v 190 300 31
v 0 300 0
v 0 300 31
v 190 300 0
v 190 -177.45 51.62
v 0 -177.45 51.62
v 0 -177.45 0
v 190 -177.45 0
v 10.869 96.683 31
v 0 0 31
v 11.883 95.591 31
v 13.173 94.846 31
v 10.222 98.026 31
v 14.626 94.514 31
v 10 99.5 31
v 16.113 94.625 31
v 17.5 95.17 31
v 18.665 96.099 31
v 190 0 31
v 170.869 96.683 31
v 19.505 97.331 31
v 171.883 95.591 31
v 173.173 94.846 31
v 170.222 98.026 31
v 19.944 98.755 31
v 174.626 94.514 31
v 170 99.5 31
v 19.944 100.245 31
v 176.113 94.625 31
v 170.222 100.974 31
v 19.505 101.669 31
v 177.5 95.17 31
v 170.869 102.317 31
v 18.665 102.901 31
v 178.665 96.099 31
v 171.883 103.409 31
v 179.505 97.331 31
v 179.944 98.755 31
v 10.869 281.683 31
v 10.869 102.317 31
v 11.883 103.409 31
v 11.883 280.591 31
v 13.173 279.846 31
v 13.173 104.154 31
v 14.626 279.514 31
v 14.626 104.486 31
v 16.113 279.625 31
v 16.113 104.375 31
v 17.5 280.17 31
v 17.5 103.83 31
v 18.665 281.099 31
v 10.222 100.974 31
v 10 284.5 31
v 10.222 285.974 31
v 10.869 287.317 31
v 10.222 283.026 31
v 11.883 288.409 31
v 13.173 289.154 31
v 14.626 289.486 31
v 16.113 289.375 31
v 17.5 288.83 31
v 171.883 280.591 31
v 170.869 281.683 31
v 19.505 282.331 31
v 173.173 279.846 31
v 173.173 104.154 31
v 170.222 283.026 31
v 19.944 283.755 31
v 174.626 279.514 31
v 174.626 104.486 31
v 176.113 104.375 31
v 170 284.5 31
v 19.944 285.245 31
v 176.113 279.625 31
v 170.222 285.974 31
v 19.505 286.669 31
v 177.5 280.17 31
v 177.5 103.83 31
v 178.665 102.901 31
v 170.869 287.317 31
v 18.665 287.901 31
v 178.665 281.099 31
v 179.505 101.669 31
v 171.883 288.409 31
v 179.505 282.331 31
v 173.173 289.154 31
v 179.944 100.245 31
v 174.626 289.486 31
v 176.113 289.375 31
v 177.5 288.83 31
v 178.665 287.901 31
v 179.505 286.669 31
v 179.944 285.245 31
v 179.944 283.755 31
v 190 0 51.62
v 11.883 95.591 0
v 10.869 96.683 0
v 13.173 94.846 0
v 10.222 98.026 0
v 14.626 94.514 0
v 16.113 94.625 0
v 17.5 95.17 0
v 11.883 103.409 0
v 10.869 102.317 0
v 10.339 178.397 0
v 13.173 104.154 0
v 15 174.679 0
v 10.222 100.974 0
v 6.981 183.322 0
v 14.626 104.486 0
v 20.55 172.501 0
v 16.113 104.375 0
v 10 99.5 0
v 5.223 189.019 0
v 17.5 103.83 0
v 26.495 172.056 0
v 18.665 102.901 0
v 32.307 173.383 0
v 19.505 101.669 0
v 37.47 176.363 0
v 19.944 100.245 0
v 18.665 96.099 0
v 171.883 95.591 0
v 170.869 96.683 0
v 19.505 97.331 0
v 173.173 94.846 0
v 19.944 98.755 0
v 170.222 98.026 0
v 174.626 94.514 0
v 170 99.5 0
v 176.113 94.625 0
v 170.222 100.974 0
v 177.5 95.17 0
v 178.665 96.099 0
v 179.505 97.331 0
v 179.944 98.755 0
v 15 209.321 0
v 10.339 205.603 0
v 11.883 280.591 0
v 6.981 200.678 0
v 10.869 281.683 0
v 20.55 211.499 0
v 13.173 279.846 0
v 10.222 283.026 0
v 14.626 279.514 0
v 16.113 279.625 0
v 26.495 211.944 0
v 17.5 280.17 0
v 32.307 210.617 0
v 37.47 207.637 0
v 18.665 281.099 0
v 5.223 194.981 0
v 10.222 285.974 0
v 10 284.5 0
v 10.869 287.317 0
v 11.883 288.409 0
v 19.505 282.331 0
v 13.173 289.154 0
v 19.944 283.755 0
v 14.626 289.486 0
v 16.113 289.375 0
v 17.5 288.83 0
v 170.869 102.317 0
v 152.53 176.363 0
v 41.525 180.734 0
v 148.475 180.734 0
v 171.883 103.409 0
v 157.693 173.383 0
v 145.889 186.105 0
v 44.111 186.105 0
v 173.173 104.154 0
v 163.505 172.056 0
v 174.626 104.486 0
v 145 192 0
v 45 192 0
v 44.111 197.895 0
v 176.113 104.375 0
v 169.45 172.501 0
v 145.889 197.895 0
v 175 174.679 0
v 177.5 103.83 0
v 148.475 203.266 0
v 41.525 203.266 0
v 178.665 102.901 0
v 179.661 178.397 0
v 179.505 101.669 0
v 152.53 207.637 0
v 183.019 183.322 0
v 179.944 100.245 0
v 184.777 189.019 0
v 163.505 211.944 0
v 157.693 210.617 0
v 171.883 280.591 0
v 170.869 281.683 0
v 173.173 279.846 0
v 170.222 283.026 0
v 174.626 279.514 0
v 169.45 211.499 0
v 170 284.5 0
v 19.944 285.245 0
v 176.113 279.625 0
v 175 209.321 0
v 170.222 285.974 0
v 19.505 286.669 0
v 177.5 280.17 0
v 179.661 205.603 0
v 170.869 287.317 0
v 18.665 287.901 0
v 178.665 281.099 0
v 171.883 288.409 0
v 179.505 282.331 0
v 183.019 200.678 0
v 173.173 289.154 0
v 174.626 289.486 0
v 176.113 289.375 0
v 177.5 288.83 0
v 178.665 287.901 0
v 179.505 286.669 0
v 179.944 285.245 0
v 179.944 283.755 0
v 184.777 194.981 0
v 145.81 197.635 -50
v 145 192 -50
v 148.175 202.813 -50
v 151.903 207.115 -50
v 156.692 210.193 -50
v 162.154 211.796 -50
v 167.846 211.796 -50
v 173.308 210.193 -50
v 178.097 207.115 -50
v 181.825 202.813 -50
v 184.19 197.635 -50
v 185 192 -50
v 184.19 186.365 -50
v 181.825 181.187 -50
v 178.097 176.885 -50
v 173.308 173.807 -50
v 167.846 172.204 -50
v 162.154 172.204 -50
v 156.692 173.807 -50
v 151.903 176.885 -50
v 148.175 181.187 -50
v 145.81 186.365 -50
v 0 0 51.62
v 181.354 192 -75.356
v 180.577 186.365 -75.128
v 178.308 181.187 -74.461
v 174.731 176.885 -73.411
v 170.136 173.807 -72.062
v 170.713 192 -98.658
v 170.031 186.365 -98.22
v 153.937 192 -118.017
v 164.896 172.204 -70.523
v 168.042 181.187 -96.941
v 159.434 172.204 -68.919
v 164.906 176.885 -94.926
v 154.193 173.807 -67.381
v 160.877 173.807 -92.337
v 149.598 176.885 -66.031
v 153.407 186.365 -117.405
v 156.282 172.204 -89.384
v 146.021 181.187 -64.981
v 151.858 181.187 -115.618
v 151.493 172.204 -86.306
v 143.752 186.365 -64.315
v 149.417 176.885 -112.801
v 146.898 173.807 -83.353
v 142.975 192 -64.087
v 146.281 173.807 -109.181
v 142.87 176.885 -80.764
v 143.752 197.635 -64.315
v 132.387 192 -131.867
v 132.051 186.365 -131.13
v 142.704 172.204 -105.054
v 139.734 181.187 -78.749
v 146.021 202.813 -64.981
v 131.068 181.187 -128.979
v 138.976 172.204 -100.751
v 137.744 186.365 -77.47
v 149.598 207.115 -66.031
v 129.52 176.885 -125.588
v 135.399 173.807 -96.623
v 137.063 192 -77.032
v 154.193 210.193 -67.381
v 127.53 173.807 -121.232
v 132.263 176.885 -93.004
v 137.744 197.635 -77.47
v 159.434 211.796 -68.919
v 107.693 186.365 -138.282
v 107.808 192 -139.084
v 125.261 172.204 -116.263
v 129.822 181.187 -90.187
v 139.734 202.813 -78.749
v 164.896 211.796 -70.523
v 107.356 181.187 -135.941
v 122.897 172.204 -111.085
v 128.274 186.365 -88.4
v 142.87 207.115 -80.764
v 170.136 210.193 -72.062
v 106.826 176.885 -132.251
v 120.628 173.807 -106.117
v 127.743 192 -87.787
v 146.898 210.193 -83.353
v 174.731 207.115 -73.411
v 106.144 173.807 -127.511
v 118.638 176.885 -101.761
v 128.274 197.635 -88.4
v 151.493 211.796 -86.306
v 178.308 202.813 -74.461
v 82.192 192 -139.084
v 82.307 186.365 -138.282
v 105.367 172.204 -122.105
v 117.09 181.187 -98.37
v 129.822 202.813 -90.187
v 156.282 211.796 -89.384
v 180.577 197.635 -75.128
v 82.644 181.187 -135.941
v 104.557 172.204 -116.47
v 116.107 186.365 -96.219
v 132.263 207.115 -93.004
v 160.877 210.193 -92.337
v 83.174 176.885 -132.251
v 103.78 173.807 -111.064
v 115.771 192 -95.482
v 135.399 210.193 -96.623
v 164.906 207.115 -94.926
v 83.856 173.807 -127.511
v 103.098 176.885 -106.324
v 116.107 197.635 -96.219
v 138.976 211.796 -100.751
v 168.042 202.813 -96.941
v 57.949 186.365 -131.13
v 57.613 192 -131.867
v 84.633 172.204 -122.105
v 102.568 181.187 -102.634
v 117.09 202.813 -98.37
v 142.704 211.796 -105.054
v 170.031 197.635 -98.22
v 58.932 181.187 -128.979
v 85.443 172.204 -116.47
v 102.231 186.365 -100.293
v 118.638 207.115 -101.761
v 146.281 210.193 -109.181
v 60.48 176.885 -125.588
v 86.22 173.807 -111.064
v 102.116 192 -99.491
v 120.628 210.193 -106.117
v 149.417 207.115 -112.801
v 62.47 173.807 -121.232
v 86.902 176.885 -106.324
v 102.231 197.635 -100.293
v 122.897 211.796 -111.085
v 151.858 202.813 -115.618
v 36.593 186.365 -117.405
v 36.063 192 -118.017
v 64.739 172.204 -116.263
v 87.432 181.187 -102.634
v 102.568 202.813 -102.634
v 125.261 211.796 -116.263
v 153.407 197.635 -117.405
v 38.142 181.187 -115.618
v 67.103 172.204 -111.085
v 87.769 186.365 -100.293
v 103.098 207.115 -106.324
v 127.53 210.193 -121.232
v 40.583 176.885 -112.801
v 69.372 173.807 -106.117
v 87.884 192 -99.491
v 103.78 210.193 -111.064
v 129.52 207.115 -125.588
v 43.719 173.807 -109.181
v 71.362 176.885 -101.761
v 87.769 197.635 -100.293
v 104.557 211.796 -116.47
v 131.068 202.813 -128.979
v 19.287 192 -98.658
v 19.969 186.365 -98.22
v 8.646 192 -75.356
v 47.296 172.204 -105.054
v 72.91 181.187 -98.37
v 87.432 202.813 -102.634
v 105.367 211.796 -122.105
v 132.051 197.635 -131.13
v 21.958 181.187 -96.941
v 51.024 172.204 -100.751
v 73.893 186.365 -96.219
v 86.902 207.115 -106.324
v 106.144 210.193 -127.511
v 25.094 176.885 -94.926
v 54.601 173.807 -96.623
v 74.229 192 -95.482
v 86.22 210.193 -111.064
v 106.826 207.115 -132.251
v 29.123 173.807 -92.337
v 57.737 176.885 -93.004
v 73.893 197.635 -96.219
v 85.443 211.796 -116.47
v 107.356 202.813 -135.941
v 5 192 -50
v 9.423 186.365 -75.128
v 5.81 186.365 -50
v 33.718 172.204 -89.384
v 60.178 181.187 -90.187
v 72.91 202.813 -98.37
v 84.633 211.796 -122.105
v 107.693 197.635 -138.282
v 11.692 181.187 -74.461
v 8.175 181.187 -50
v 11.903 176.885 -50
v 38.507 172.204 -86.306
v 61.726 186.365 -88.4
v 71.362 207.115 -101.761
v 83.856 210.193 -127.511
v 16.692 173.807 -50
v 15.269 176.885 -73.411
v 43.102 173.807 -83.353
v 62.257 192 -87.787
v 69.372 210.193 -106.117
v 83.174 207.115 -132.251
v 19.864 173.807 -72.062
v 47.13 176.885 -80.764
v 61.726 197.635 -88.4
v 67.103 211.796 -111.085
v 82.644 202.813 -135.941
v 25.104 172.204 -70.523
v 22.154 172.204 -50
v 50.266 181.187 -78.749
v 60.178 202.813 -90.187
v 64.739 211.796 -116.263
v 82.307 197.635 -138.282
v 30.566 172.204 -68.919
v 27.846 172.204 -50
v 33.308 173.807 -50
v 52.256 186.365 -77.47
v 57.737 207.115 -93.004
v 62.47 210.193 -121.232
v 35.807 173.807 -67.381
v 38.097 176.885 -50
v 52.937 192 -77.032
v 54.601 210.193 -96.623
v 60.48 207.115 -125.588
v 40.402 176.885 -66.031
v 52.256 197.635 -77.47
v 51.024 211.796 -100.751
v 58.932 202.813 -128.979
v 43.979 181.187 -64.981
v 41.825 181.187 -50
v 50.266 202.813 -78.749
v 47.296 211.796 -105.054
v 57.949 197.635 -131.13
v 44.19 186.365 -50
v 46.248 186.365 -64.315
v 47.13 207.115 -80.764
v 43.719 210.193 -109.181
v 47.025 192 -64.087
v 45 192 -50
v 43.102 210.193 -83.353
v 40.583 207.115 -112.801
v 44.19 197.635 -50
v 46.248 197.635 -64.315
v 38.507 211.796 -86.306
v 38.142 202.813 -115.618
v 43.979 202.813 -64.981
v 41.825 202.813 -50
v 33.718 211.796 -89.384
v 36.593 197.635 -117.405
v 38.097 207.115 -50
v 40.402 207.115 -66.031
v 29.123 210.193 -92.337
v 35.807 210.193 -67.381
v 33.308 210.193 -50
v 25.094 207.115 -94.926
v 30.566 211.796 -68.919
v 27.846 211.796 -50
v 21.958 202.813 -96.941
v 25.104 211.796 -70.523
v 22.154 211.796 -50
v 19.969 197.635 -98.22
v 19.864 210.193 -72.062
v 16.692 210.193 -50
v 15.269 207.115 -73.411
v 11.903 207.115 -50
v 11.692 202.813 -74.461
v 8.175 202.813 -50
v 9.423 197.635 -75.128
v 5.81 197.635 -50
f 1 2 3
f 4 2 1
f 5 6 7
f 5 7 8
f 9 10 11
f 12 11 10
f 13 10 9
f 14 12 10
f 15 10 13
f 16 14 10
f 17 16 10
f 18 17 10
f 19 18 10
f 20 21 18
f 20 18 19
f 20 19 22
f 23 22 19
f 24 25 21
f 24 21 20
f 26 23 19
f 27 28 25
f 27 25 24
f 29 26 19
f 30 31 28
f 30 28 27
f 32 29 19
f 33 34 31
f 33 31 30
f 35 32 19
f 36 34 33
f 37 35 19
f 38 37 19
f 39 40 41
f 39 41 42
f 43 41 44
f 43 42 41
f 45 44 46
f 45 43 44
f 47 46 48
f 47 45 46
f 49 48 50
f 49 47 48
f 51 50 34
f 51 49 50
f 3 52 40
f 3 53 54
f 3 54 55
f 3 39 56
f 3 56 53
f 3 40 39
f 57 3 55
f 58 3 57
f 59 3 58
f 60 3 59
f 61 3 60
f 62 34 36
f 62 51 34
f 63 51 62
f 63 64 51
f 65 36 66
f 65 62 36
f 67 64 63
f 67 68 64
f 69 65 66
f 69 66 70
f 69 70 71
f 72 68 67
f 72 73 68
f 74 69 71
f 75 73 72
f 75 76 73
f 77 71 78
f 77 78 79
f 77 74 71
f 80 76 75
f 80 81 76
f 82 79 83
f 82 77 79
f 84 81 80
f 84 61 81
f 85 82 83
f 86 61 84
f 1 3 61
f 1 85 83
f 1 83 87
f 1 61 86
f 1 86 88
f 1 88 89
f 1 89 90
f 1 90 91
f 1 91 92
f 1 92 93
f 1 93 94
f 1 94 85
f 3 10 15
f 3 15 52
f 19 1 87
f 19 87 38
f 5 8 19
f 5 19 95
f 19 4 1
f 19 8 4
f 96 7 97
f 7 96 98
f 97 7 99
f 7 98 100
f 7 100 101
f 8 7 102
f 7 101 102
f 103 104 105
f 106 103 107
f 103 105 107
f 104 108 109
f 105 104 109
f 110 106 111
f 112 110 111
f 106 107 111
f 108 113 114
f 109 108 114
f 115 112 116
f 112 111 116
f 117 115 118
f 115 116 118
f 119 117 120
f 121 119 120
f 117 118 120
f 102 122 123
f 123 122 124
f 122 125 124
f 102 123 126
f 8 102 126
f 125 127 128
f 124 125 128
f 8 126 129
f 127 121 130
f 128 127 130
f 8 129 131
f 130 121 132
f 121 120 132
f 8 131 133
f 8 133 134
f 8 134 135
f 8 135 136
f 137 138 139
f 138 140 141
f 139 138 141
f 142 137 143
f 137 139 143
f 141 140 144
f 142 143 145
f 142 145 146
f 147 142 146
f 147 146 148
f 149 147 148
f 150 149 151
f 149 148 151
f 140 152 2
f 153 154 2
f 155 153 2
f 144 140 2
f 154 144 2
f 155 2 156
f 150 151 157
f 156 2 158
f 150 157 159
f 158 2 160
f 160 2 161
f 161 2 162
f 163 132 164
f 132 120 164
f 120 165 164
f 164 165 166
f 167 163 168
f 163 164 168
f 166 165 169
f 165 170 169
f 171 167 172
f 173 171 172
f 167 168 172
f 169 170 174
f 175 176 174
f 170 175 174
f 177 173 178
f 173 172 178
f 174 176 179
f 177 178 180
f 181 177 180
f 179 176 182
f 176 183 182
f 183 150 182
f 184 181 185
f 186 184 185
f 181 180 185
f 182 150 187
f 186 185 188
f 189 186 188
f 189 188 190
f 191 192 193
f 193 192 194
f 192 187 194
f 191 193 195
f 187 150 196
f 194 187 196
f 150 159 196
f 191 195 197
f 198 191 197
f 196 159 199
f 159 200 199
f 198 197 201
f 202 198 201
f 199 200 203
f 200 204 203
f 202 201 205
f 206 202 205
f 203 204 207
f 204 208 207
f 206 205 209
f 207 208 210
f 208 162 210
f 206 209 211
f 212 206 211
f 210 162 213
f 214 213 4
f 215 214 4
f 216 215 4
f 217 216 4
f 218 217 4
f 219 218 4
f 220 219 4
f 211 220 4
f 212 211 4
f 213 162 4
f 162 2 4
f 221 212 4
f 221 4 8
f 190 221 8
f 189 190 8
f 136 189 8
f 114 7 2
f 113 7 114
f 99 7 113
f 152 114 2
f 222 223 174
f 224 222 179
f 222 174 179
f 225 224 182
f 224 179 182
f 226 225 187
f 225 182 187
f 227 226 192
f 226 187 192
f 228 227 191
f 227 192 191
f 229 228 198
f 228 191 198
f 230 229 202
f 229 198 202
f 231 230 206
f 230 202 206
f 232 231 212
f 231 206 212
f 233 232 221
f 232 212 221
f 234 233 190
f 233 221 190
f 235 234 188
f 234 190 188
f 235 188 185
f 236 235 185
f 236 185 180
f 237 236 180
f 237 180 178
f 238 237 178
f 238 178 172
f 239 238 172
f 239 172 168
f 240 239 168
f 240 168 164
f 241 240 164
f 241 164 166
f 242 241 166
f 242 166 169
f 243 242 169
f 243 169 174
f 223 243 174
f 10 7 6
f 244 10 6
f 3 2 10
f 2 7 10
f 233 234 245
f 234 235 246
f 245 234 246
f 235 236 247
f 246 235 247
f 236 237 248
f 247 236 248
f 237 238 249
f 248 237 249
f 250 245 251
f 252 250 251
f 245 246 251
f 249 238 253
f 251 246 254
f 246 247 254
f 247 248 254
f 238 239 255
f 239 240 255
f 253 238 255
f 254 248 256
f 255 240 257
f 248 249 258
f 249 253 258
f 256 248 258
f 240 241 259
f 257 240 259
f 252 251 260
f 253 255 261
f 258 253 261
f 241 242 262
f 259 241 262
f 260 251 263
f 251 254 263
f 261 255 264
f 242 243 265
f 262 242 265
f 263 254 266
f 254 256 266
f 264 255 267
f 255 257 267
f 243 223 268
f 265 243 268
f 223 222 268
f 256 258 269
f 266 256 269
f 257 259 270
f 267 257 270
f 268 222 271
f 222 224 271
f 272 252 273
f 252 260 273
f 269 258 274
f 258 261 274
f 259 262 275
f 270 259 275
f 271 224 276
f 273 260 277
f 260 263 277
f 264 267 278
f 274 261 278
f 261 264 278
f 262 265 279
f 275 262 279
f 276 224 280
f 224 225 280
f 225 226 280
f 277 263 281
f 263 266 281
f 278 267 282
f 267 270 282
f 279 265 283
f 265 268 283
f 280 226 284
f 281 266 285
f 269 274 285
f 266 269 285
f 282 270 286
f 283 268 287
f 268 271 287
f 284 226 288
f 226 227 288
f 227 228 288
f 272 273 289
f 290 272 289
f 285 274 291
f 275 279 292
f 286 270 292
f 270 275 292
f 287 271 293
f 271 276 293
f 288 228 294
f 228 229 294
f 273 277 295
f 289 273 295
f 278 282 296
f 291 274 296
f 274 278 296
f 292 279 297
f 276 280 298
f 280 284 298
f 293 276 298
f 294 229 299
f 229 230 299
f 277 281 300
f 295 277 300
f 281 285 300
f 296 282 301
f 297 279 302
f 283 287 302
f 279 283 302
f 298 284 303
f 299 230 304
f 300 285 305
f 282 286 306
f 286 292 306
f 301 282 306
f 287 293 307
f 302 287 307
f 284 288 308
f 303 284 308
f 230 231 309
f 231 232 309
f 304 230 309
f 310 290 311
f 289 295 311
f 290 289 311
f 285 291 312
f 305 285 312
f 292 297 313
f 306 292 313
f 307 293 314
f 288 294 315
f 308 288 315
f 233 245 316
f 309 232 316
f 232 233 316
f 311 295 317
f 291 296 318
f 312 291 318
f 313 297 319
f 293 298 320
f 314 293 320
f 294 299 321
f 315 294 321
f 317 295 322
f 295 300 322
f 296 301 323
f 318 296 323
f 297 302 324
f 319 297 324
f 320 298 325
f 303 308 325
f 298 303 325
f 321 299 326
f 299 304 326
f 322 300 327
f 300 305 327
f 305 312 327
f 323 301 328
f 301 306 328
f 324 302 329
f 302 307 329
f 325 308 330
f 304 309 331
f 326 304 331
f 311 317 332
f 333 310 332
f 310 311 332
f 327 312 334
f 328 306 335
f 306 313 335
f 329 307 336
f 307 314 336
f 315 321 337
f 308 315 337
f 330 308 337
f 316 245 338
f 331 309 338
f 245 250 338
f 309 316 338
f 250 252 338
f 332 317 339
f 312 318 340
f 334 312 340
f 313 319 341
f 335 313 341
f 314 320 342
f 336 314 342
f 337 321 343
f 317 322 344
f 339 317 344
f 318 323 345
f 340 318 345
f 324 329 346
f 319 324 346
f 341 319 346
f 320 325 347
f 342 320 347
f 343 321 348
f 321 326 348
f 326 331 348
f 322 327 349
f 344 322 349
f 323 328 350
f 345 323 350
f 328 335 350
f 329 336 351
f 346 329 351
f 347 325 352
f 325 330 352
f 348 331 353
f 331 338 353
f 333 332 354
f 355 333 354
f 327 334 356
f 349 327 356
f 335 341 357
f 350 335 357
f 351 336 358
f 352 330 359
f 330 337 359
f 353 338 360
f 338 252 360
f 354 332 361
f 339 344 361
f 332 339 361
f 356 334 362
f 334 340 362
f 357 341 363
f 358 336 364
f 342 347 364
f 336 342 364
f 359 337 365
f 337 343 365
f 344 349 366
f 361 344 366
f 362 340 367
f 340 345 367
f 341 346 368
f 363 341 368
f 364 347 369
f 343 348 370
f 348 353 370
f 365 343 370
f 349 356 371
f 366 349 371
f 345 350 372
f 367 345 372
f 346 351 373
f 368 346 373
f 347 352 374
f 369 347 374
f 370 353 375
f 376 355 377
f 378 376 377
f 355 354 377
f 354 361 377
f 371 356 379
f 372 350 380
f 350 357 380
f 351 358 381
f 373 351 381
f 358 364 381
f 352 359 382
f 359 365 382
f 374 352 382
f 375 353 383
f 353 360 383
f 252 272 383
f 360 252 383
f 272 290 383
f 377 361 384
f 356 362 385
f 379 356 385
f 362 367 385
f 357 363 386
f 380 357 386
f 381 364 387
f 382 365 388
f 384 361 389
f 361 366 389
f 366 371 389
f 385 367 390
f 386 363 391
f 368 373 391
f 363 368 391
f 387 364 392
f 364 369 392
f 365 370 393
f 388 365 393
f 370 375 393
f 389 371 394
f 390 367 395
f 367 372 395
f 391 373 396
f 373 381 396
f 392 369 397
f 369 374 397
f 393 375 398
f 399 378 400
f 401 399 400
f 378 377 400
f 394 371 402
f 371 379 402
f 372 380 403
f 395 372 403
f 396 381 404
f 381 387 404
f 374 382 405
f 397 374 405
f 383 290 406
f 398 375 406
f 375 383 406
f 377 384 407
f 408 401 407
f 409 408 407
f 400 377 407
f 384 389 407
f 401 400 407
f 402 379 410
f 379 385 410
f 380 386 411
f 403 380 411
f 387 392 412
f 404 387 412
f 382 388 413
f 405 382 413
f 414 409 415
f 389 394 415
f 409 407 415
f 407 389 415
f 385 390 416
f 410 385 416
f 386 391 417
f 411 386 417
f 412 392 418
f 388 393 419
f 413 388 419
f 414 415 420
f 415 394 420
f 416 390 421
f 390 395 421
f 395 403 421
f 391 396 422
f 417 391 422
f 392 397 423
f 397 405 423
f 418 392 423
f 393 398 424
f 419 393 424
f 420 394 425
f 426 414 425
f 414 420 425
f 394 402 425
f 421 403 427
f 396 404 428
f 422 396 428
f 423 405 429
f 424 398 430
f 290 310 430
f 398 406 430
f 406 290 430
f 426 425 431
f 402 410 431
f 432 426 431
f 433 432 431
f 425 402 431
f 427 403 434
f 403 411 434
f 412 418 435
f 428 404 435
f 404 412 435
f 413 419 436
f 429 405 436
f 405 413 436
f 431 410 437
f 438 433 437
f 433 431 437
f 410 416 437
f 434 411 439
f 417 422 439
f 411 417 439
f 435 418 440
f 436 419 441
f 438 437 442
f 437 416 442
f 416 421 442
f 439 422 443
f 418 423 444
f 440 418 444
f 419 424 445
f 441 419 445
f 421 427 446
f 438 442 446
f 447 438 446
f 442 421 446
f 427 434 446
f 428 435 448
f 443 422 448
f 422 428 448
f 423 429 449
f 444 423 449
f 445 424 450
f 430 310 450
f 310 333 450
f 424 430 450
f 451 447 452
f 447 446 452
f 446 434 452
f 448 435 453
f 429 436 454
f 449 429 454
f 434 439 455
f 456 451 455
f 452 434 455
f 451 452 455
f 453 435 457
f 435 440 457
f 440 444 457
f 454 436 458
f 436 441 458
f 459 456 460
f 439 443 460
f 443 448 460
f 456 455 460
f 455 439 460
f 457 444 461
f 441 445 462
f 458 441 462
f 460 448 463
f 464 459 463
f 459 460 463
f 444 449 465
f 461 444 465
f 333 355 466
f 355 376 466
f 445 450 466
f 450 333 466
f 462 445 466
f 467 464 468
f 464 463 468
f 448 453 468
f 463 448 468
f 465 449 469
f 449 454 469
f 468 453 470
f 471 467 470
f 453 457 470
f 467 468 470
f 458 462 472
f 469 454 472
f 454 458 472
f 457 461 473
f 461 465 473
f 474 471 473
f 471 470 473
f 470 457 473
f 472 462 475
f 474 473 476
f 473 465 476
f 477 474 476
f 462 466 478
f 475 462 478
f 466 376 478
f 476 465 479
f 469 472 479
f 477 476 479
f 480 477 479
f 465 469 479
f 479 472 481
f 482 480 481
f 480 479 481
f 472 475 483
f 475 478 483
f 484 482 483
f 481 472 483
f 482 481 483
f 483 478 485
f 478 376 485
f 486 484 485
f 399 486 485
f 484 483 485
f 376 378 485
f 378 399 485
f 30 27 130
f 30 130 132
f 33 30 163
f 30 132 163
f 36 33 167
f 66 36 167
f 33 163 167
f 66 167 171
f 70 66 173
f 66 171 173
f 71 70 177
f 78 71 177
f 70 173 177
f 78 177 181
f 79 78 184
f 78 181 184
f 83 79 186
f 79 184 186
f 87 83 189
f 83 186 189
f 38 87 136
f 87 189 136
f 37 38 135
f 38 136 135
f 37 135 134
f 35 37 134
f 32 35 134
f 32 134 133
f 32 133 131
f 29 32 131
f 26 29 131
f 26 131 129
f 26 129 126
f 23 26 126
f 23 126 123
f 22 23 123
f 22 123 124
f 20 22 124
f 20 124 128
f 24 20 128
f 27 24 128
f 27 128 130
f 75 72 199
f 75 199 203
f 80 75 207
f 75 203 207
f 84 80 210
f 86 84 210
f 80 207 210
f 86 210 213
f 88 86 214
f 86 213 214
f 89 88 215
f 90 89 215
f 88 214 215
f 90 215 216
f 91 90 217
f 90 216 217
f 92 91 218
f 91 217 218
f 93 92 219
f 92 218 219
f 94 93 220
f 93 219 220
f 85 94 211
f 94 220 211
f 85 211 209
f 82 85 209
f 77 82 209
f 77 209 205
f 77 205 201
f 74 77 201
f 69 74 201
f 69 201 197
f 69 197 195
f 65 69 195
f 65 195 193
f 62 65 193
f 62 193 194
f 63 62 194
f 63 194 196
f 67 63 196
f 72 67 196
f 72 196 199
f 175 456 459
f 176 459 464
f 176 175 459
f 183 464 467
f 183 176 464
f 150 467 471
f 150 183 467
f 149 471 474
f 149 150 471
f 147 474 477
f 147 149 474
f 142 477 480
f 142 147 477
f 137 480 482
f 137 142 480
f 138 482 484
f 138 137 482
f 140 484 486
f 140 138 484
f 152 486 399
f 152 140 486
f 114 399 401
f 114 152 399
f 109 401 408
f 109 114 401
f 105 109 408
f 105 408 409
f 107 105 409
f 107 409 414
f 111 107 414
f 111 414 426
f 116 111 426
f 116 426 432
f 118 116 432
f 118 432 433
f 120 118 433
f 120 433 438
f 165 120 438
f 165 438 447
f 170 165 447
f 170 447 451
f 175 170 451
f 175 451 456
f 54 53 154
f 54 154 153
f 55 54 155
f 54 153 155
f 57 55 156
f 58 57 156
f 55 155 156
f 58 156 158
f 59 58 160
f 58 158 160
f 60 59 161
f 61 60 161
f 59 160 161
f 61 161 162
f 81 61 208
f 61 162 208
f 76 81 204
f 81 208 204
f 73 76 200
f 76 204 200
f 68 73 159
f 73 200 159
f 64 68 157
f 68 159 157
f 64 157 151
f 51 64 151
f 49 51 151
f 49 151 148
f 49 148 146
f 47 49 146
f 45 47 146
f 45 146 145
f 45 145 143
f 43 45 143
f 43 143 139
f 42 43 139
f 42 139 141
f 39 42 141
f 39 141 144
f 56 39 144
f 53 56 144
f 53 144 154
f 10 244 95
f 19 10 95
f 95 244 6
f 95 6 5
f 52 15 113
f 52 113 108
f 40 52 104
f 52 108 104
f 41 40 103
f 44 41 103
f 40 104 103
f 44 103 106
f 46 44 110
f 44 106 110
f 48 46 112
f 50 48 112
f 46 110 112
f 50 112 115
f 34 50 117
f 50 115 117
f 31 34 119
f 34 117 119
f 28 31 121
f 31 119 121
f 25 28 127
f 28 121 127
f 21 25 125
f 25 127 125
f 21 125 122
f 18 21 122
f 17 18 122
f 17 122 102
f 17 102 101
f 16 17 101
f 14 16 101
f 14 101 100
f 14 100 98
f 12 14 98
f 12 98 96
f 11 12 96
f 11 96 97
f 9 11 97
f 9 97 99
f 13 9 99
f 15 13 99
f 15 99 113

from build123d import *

# Parameters (mm, degrees)
ESQUISSE1_W             = 190
ESQUISSE1_H             = 300
BOSS_EXTRU_1_DEPTH      = 31
ESQUISSE2_R             = 5
ENL_V_MAT_EXTRU_1_DEPTH = 357.456168413
ESQUISSE3_W             = 190
ESQUISSE3_H             = 51.62
BOSS_EXTRU_2_DEPTH      = 177.45
ESQUISSE4_R             = 20
BOSS_EXTRU_3_DEPTH      = 50
ESQUISSE6_R             = 20
R_VOLUTION1_ANGLE       = 180


with BuildPart() as part:
    # Esquisse1 → Boss.-Extru.1 (new body)
    with BuildSketch(Plane.XY):
        with Locations((95, 150)):
            Rectangle(ESQUISSE1_W, ESQUISSE1_H)
    extrude(amount=BOSS_EXTRU_1_DEPTH)

    # Esquisse2 → Enlèv. mat.-Extru.1 (cut, through all)
    with BuildSketch(Plane(origin=(0, 0, 0), x_dir=(-1, 0, 0), z_dir=(0, 0, -1))):
        with Locations((-175, 284.5)):
            Circle(ESQUISSE2_R)
        with Locations((-15, 284.5)):
            Circle(ESQUISSE2_R)
        with Locations((-175, 99.5)):
            Circle(ESQUISSE2_R)
        with Locations((-15, 99.5)):
            Circle(ESQUISSE2_R)
    extrude(amount=-ENL_V_MAT_EXTRU_1_DEPTH, mode=Mode.SUBTRACT)

    # Esquisse3 → Boss.-Extru.2 (add)
    with BuildSketch(Plane.XZ):
        with Locations((95, 25.81)):
            Rectangle(ESQUISSE3_W, ESQUISSE3_H)
    extrude(amount=BOSS_EXTRU_2_DEPTH)

    # Esquisse4 → Boss.-Extru.3 (add)
    with BuildSketch(Plane(origin=(0, 0, 0), x_dir=(-1, 0, 0), z_dir=(0, 0, -1))):
        with Locations((-165, 192)):
            Circle(ESQUISSE4_R)
    boss_extru_3 = extrude(amount=BOSS_EXTRU_3_DEPTH)

    # Symétrie1: Boss.-Extru.3 across plane
    add(boss_extru_3.mirror(Plane(origin=(95, 0, 0), x_dir=(0, 0, 1), z_dir=(1, 0, 0))))

    # Esquisse6 → Révolution1 (revolve)
    with BuildSketch(Plane(origin=(0, 0, -50), x_dir=(-1, 0, 0), z_dir=(0, 0, -1))):
        with Locations(Location((-165, 192, 0), (0, 0, 180))):
            Circle(ESQUISSE6_R)
    revolve(axis=Axis((95, -201.3225, -50), (0, 1, 0)), revolution_arc=R_VOLUTION1_ANGLE)


solid = part.part
